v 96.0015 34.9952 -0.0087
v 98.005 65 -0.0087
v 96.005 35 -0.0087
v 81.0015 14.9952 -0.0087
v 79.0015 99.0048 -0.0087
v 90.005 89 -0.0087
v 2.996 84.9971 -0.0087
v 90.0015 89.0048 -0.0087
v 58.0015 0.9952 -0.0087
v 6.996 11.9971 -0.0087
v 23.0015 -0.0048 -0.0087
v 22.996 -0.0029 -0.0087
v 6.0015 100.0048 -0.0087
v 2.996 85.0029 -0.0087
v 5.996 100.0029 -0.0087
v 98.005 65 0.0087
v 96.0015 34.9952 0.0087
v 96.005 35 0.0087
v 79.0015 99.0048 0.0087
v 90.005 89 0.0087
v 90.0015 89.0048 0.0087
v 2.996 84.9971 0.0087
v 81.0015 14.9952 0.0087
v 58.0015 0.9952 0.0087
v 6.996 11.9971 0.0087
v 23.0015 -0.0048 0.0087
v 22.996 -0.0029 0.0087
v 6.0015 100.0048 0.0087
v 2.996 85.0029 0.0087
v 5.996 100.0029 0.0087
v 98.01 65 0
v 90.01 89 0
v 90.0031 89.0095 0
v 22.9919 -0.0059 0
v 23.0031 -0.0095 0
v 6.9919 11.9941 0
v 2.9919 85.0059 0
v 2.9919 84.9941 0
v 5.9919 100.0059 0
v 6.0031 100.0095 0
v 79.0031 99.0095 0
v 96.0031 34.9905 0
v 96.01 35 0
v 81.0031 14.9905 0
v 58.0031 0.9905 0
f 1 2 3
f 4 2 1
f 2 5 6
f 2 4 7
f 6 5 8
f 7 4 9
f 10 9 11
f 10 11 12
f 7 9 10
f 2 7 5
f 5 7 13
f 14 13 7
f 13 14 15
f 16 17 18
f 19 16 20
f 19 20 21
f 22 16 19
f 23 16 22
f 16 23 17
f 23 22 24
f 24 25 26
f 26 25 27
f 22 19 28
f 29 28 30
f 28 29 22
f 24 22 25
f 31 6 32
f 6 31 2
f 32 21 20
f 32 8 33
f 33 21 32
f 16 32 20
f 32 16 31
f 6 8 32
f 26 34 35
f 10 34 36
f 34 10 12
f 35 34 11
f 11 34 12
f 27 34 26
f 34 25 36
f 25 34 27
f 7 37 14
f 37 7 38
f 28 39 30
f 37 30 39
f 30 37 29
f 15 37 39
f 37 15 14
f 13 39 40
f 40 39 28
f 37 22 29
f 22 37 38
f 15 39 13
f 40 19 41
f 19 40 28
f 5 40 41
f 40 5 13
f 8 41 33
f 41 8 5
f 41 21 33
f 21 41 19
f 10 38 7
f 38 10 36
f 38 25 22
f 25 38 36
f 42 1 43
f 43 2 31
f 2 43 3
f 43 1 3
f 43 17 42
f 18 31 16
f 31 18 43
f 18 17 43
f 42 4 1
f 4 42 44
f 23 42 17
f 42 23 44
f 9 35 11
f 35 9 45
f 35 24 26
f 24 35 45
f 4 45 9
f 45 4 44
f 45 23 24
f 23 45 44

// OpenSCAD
color([0.9269770591996176,0.12480324665016229,0.8422397758241813]) hull(){
    translate([18,58]) sphere(0.01);
    translate([7,12]) sphere(0.01);
    translate([18,24]) sphere(0.01);
}
color([0.028249143050612435,0.8554899328562455,0.6212809598996976]) hull(){
    translate([90,89]) sphere(0.01);
    translate([93,72]) sphere(0.01);
    translate([98,65]) sphere(0.01);
}
color([0.6435486749275994,0.4857227915978113,0.2898251547629681]) hull(){
    translate([67,87]) sphere(0.01);
    translate([93,72]) sphere(0.01);
    translate([90,89]) sphere(0.01);
}
color([0.21709076393122206,0.4979948584580751,0.6176241526046676]) hull(){
    translate([93,72]) sphere(0.01);
    translate([67,87]) sphere(0.01);
    translate([63,74]) sphere(0.01);
}
color([0.4722249532281336,0.7228331534363125,0.6109414561657331]) hull(){
    translate([21,6]) sphere(0.01);
    translate([7,12]) sphere(0.01);
    translate([23,0]) sphere(0.01);
}
color([0.5330085163671737,0.6769359871291822,0.5973748769978083]) hull(){
    translate([7,12]) sphere(0.01);
    translate([21,6]) sphere(0.01);
    translate([18,24]) sphere(0.01);
}
color([0.14460255854654236,0.21273280877313017,0.8417179364881341]) hull(){
    translate([75,43]) sphere(0.01);
    translate([77,50]) sphere(0.01);
    translate([44,47]) sphere(0.01);
}
color([0.6300391880279899,0.5103677782275869,0.4479627161837708]) hull(){
    translate([10,94]) sphere(0.01);
    translate([6,100]) sphere(0.01);
    translate([3,85]) sphere(0.01);
}
color([0.2903518628620462,0.1744676713524972,0.5457372127765215]) hull(){
    translate([6,100]) sphere(0.01);
    translate([18,99]) sphere(0.01);
    translate([79,99]) sphere(0.01);
}
color([0.6340658375422632,0.7004271366493812,0.690956934786038]) hull(){
    translate([10,94]) sphere(0.01);
    translate([18,99]) sphere(0.01);
    translate([6,100]) sphere(0.01);
}
color([0.013948469234104865,0.8018456354370093,0.2607079205191076]) hull(){
    translate([39,98]) sphere(0.01);
    translate([31,91]) sphere(0.01);
    translate([37,88]) sphere(0.01);
}
color([0.01899716010339858,0.7507132946374245,0.44168653561511173]) hull(){
    translate([18,99]) sphere(0.01);
    translate([31,91]) sphere(0.01);
    translate([39,98]) sphere(0.01);
}
color([0.1668653701245908,0.45955837321901094,0.7876756969907556]) hull(){
    translate([31,91]) sphere(0.01);
    translate([18,99]) sphere(0.01);
    translate([22,90]) sphere(0.01);
}
color([0.09564527702692727,0.06733136152719421,0.7816649665975636]) hull(){
    translate([83,95]) sphere(0.01);
    translate([90,89]) sphere(0.01);
    translate([79,99]) sphere(0.01);
}
color([0.030385075649315252,0.33346286891595733,0.08647112242809318]) hull(){
    translate([83,95]) sphere(0.01);
    translate([67,87]) sphere(0.01);
    translate([90,89]) sphere(0.01);
}
color([0.8161439782233904,0.05657658467482607,0.8243668117903717]) hull(){
    translate([70,96]) sphere(0.01);
    translate([83,95]) sphere(0.01);
    translate([79,99]) sphere(0.01);
}
color([0.05808931884644186,0.6181904095369413,0.1426995958976538]) hull(){
    translate([83,95]) sphere(0.01);
    translate([70,96]) sphere(0.01);
    translate([67,87]) sphere(0.01);
}
color([0.3846464495954227,0.3794414211645075,0.7643773332264734]) hull(){
    translate([67,87]) sphere(0.01);
    translate([50,93]) sphere(0.01);
    translate([63,74]) sphere(0.01);
}
color([0.3116889002403487,0.7690158776827113,0.7674729074453902]) hull(){
    translate([24,21]) sphere(0.01);
    translate([26,22]) sphere(0.01);
    translate([18,24]) sphere(0.01);
}
color([0.3394448706328078,0.45855440081433096,0.0007502935671159783]) hull(){
    translate([21,6]) sphere(0.01);
    translate([24,21]) sphere(0.01);
    translate([18,24]) sphere(0.01);
}
color([0.8084995756647368,0.0331322283588068,0.9954935019736515]) hull(){
    translate([80,52]) sphere(0.01);
    translate([93,72]) sphere(0.01);
    translate([63,74]) sphere(0.01);
}
color([0.32750610520168044,0.511786711221762,0.09639677946248049]) hull(){
    translate([77,50]) sphere(0.01);
    translate([80,52]) sphere(0.01);
    translate([63,74]) sphere(0.01);
}
color([0.46647601470953737,0.043404226035316795,0.8089506697449751]) hull(){
    translate([7,12]) sphere(0.01);
    translate([6,77]) sphere(0.01);
    translate([3,85]) sphere(0.01);
}
color([0.9065579579370614,0.48874197586323487,0.4689182776921319]) hull(){
    translate([18,58]) sphere(0.01);
    translate([6,77]) sphere(0.01);
    translate([7,12]) sphere(0.01);
}
color([0.9999833648369341,0.42392948264922625,0.11056216143511133]) hull(){
    translate([7,86]) sphere(0.01);
    translate([10,94]) sphere(0.01);
    translate([3,85]) sphere(0.01);
}
color([0.5007484231317689,0.23725843071495933,0.7435751616565288]) hull(){
    translate([16,79]) sphere(0.01);
    translate([6,77]) sphere(0.01);
    translate([18,58]) sphere(0.01);
}
color([0.030326511183225713,0.9534383365251057,0.44454391677925087]) hull(){
    translate([16,79]) sphere(0.01);
    translate([39,67]) sphere(0.01);
    translate([20,83]) sphere(0.01);
}
color([0.4017260225039573,0.6984802625757133,0.14751428227125585]) hull(){
    translate([39,67]) sphere(0.01);
    translate([46,61]) sphere(0.01);
    translate([43,69]) sphere(0.01);
}
color([0.592053202978914,0.7602792343344718,0.23214841748979886]) hull(){
    translate([18,99]) sphere(0.01);
    translate([15,91]) sphere(0.01);
    translate([22,90]) sphere(0.01);
}
color([0.2215781656479593,0.24536616409996503,0.7021925659500807]) hull(){
    translate([15,91]) sphere(0.01);
    translate([18,99]) sphere(0.01);
    translate([10,94]) sphere(0.01);
}
color([0.5457605096294114,0.54011508338913,0.5459453680001618]) hull(){
    translate([15,91]) sphere(0.01);
    translate([20,83]) sphere(0.01);
    translate([22,90]) sphere(0.01);
}
color([0.21439919344985514,0.4167057873106884,0.6193494045718565]) hull(){
    translate([7,86]) sphere(0.01);
    translate([15,91]) sphere(0.01);
    translate([10,94]) sphere(0.01);
}
color([0.45760594266221877,0.8933837090972113,0.8109172526149769]) hull(){
    translate([15,91]) sphere(0.01);
    translate([16,79]) sphere(0.01);
    translate([20,83]) sphere(0.01);
}
color([0.14833972802097417,0.6068004170768148,0.5080529466064481]) hull(){
    translate([16,79]) sphere(0.01);
    translate([15,91]) sphere(0.01);
    translate([7,86]) sphere(0.01);
}
color([0.9906187087676633,0.11352393843166497,0.6883720652754897]) hull(){
    translate([31,91]) sphere(0.01);
    translate([30,90]) sphere(0.01);
    translate([37,88]) sphere(0.01);
}
color([0.5952346609945763,0.6540807806784664,0.3474259839548979]) hull(){
    translate([20,83]) sphere(0.01);
    translate([30,90]) sphere(0.01);
    translate([22,90]) sphere(0.01);
}
color([0.9928586924360654,0.247192741454632,0.70975753974483]) hull(){
    translate([30,90]) sphere(0.01);
    translate([31,91]) sphere(0.01);
    translate([22,90]) sphere(0.01);
}
color([0.13794757021236903,0.4611444179186315,0.04899626755467579]) hull(){
    translate([51,97]) sphere(0.01);
    translate([39,98]) sphere(0.01);
    translate([37,88]) sphere(0.01);
}
color([0.1977229983916683,0.036370797334404625,0.13840798504488894]) hull(){
    translate([70,96]) sphere(0.01);
    translate([64,91]) sphere(0.01);
    translate([67,87]) sphere(0.01);
}
color([0.695134065044521,0.2654011745990712,0.4635417367699751]) hull(){
    translate([64,91]) sphere(0.01);
    translate([50,93]) sphere(0.01);
    translate([67,87]) sphere(0.01);
}
color([0.14067843926211876,0.3233092624720053,0.6766209265725885]) hull(){
    translate([38,83]) sphere(0.01);
    translate([39,67]) sphere(0.01);
    translate([43,69]) sphere(0.01);
}
color([0.5598941248919586,0.2674263193966361,0.7715367321750608]) hull(){
    translate([38,83]) sphere(0.01);
    translate([51,97]) sphere(0.01);
    translate([37,88]) sphere(0.01);
}
color([0.7775867750177572,0.3358457771023752,0.7984986383285079]) hull(){
    translate([51,97]) sphere(0.01);
    translate([38,83]) sphere(0.01);
    translate([50,93]) sphere(0.01);
}
color([0.3608344962449672,0.130636609727118,0.1470050456404287]) hull(){
    translate([39,67]) sphere(0.01);
    translate([38,83]) sphere(0.01);
    translate([20,83]) sphere(0.01);
}
color([0.5817121628313788,0.46286602772829477,0.8824527290015699]) hull(){
    translate([30,90]) sphere(0.01);
    translate([38,83]) sphere(0.01);
    translate([37,88]) sphere(0.01);
}
color([0.1201105517589024,0.1938197880719691,0.4695931850983104]) hull(){
    translate([38,83]) sphere(0.01);
    translate([30,90]) sphere(0.01);
    translate([20,83]) sphere(0.01);
}
color([0.14078313852784263,0.6451769219884874,0.9811903017448982]) hull(){
    translate([45,42]) sphere(0.01);
    translate([42,29]) sphere(0.01);
    translate([55,32]) sphere(0.01);
}
color([0.8740229692652243,0.6541461711493592,0.21289315855754942]) hull(){
    translate([45,42]) sphere(0.01);
    translate([58,33]) sphere(0.01);
    translate([44,47]) sphere(0.01);
}
color([0.9328418457966335,0.42345059226773774,0.5012376899041451]) hull(){
    translate([58,33]) sphere(0.01);
    translate([45,42]) sphere(0.01);
    translate([55,32]) sphere(0.01);
}
color([0.5811541702347708,0.2791891573101454,0.2092311813057095]) hull(){
    translate([32,18]) sphere(0.01);
    translate([42,29]) sphere(0.01);
    translate([26,22]) sphere(0.01);
}
color([0.9628933046967749,0.6198760626942967,0.5999578261672418]) hull(){
    translate([32,18]) sphere(0.01);
    translate([21,6]) sphere(0.01);
    translate([23,0]) sphere(0.01);
}
color([0.23874719597172656,0.5159213977515871,0.8042715508319355]) hull(){
    translate([24,21]) sphere(0.01);
    translate([32,18]) sphere(0.01);
    translate([26,22]) sphere(0.01);
}
color([0.6755197251802578,0.41487488756696345,0.5733633065217538]) hull(){
    translate([32,18]) sphere(0.01);
    translate([24,21]) sphere(0.01);
    translate([21,6]) sphere(0.01);
}
color([0.8352652083788017,0.4789645616530247,0.8888242662849705]) hull(){
    translate([93,72]) sphere(0.01);
    translate([91,55]) sphere(0.01);
    translate([98,65]) sphere(0.01);
}
color([0.7977003312522131,0.4430245559395397,0.5757872208285841]) hull(){
    translate([80,52]) sphere(0.01);
    translate([91,55]) sphere(0.01);
    translate([93,72]) sphere(0.01);
}
color([0.18894415855786206,0.8084526775944827,0.5240727557148024]) hull(){
    translate([91,55]) sphere(0.01);
    translate([96,35]) sphere(0.01);
    translate([98,65]) sphere(0.01);
}
color([0.33009817895383553,0.6358447971330878,0.274476683198677]) hull(){
    translate([6,77]) sphere(0.01);
    translate([6,84]) sphere(0.01);
    translate([3,85]) sphere(0.01);
}
color([0.7036882936284021,0.9548751840233447,0.5755708060880032]) hull(){
    translate([6,84]) sphere(0.01);
    translate([7,86]) sphere(0.01);
    translate([3,85]) sphere(0.01);
}
color([0.41204698353559877,0.5796286851254486,0.28286322414623355]) hull(){
    translate([16,79]) sphere(0.01);
    translate([6,84]) sphere(0.01);
    translate([6,77]) sphere(0.01);
}
color([0.83488960487533,0.7968053445508819,0.9111606805714901]) hull(){
    translate([6,84]) sphere(0.01);
    translate([16,79]) sphere(0.01);
    translate([7,86]) sphere(0.01);
}
color([0.24277728252059738,0.2698201644401115,0.25372921938475945]) hull(){
    translate([30,57]) sphere(0.01);
    translate([16,79]) sphere(0.01);
    translate([18,58]) sphere(0.01);
}
color([0.3248429479181304,0.33731838939050207,0.46012102584031667]) hull(){
    translate([30,57]) sphere(0.01);
    translate([39,67]) sphere(0.01);
    translate([16,79]) sphere(0.01);
}
color([0.4972140619467261,0.4460540182101679,0.582257111213957]) hull(){
    translate([58,98]) sphere(0.01);
    translate([51,97]) sphere(0.01);
    translate([50,93]) sphere(0.01);
}
color([0.38189019333285656,0.9329183366158048,0.74346568951076]) hull(){
    translate([58,98]) sphere(0.01);
    translate([64,91]) sphere(0.01);
    translate([70,96]) sphere(0.01);
}
color([0.10367473231816282,0.6513301228797536,0.21210212161149367]) hull(){
    translate([64,91]) sphere(0.01);
    translate([58,98]) sphere(0.01);
    translate([50,93]) sphere(0.01);
}
color([0.4071949612628585,0.6715659813617996,0.17871221391606673]) hull(){
    translate([58,98]) sphere(0.01);
    translate([70,96]) sphere(0.01);
    translate([79,99]) sphere(0.01);
}
color([0.17752412341011714,0.6556599876579107,0.7040052939421468]) hull(){
    translate([51,97]) sphere(0.01);
    translate([58,98]) sphere(0.01);
    translate([39,98]) sphere(0.01);
}
color([0.9236087761692187,0.21340315940002685,0.5989435772305987]) hull(){
    translate([50,93]) sphere(0.01);
    translate([59,71]) sphere(0.01);
    translate([63,74]) sphere(0.01);
}
color([0.8450733127471588,0.6003349610680997,0.5954496070156984]) hull(){
    translate([38,83]) sphere(0.01);
    translate([59,71]) sphere(0.01);
    translate([50,93]) sphere(0.01);
}
color([0.920709623693076,0.4233833186292486,0.4754938941291812]) hull(){
    translate([59,71]) sphere(0.01);
    translate([38,83]) sphere(0.01);
    translate([43,69]) sphere(0.01);
}
color([0.872421437716006,0.9767589381362137,0.9086126193256788]) hull(){
    translate([46,61]) sphere(0.01);
    translate([59,71]) sphere(0.01);
    translate([43,69]) sphere(0.01);
}
color([0.7884233486788577,0.8262914624918754,0.6636415038118221]) hull(){
    translate([59,71]) sphere(0.01);
    translate([77,50]) sphere(0.01);
    translate([63,74]) sphere(0.01);
}
color([0.36270118963089737,0.5138414630226216,0.14357255994509865]) hull(){
    translate([59,71]) sphere(0.01);
    translate([46,61]) sphere(0.01);
    translate([77,50]) sphere(0.01);
}
color([0.466624584989368,0.29734697142143796,0.9844700368526675]) hull(){
    translate([76,28]) sphere(0.01);
    translate([74,41]) sphere(0.01);
    translate([58,33]) sphere(0.01);
}
color([0.6752891164641136,0.29017518075598103,0.4342964607752302]) hull(){
    translate([74,41]) sphere(0.01);
    translate([75,43]) sphere(0.01);
    translate([44,47]) sphere(0.01);
}
color([0.773003957160343,0.565247166210502,0.9239404304157245]) hull(){
    translate([58,33]) sphere(0.01);
    translate([74,41]) sphere(0.01);
    translate([44,47]) sphere(0.01);
}
color([0.16032310979410902,0.8355206000915061,0.5688487402091276]) hull(){
    translate([72,20]) sphere(0.01);
    translate([76,28]) sphere(0.01);
    translate([58,33]) sphere(0.01);
}
color([0.20030491603062106,0.9799112189115262,0.7788088383598656]) hull(){
    translate([72,20]) sphere(0.01);
    translate([68,15]) sphere(0.01);
    translate([81,15]) sphere(0.01);
}
color([0.3331229107175697,0.956723341350572,0.8892995412421422]) hull(){
    translate([32,18]) sphere(0.01);
    translate([64,14]) sphere(0.01);
    translate([42,29]) sphere(0.01);
}
color([0.9938355783742772,0.5564778243748569,0.9329279768345969]) hull(){
    translate([42,29]) sphere(0.01);
    translate([64,14]) sphere(0.01);
    translate([55,32]) sphere(0.01);
}
color([0.35340897744289224,0.12062022214202717,0.7238287945893779]) hull(){
    translate([64,14]) sphere(0.01);
    translate([58,33]) sphere(0.01);
    translate([55,32]) sphere(0.01);
}
color([0.8432397019629626,0.2883830928152321,0.23139986036280558]) hull(){
    translate([64,14]) sphere(0.01);
    translate([72,20]) sphere(0.01);
    translate([58,33]) sphere(0.01);
}
color([0.0180364627349191,0.35314011923198985,0.9589424474672257]) hull(){
    translate([72,20]) sphere(0.01);
    translate([64,14]) sphere(0.01);
    translate([68,15]) sphere(0.01);
}
color([0.2619290021782883,0.20369548429490625,0.5420815487250377]) hull(){
    translate([91,55]) sphere(0.01);
    translate([81,49]) sphere(0.01);
    translate([96,35]) sphere(0.01);
}
color([0.9221305525684157,0.837748898711002,0.8622867035840079]) hull(){
    translate([81,49]) sphere(0.01);
    translate([91,55]) sphere(0.01);
    translate([80,52]) sphere(0.01);
}
color([0.727429224436118,0.821332708873966,0.2567577523046298]) hull(){
    translate([96,35]) sphere(0.01);
    translate([81,49]) sphere(0.01);
    translate([75,43]) sphere(0.01);
}
color([0.1353372895865157,0.7613019869252476,0.15437996216449157]) hull(){
    translate([81,49]) sphere(0.01);
    translate([77,50]) sphere(0.01);
    translate([75,43]) sphere(0.01);
}
color([0.5724302025923821,0.22728732004270547,0.8377719495956792]) hull(){
    translate([81,49]) sphere(0.01);
    translate([80,52]) sphere(0.01);
    translate([77,50]) sphere(0.01);
}
color([0.3661955888727618,0.7135191579002272,0.515047468161266]) hull(){
    translate([35,48]) sphere(0.01);
    translate([45,42]) sphere(0.01);
    translate([44,47]) sphere(0.01);
}
color([0.13764795316468892,0.40448573996937276,0.8917260836787828]) hull(){
    translate([42,29]) sphere(0.01);
    translate([35,48]) sphere(0.01);
    translate([26,22]) sphere(0.01);
}
color([0.7643233656004556,0.5236824296690593,0.15029798138806982]) hull(){
    translate([45,42]) sphere(0.01);
    translate([35,48]) sphere(0.01);
    translate([42,29]) sphere(0.01);
}
color([0.9580407420374472,0.6000911555631969,0.025324835711835636]) hull(){
    translate([39,67]) sphere(0.01);
    translate([44,55]) sphere(0.01);
    translate([46,61]) sphere(0.01);
}
color([0.8628581448400192,0.48332959823715915,0.760144685355809]) hull(){
    translate([30,57]) sphere(0.01);
    translate([44,55]) sphere(0.01);
    translate([39,67]) sphere(0.01);
}
color([0.17349489212301172,0.7172022627612936,0.8738126079333703]) hull(){
    translate([35,48]) sphere(0.01);
    translate([44,55]) sphere(0.01);
    translate([30,57]) sphere(0.01);
}
color([0.7407081150283871,0.1750257628023656,0.7717601752613227]) hull(){
    translate([44,55]) sphere(0.01);
    translate([35,48]) sphere(0.01);
    translate([44,47]) sphere(0.01);
}
color([0.17462951192396858,0.1365817917740666,0.790898096633715]) hull(){
    translate([77,50]) sphere(0.01);
    translate([44,55]) sphere(0.01);
    translate([44,47]) sphere(0.01);
}
color([0.05068813004758421,0.2747417086491215,0.9775332998919624]) hull(){
    translate([46,61]) sphere(0.01);
    translate([44,55]) sphere(0.01);
    translate([77,50]) sphere(0.01);
}
color([0.3741990821064618,0.5760507248775137,0.9764706525564496]) hull(){
    translate([96,35]) sphere(0.01);
    translate([82,26]) sphere(0.01);
    translate([81,15]) sphere(0.01);
}
color([0.6412339051880062,0.9116486495874845,0.653753263894704]) hull(){
    translate([82,26]) sphere(0.01);
    translate([96,35]) sphere(0.01);
    translate([75,43]) sphere(0.01);
}
color([0.7391387592304974,0.7973855488942889,0.8338139774032114]) hull(){
    translate([74,41]) sphere(0.01);
    translate([82,26]) sphere(0.01);
    translate([75,43]) sphere(0.01);
}
color([0.5893068505654989,0.9387852932083598,0.6768105799142914]) hull(){
    translate([58,1]) sphere(0.01);
    translate([32,18]) sphere(0.01);
    translate([23,0]) sphere(0.01);
}
color([0.26314077483765086,0.6459233453457565,0.8790980253849315]) hull(){
    translate([58,1]) sphere(0.01);
    translate([64,14]) sphere(0.01);
    translate([32,18]) sphere(0.01);
}
color([0.15362837418895858,0.31061588741770185,0.8944360920803668]) hull(){
    translate([68,15]) sphere(0.01);
    translate([58,1]) sphere(0.01);
    translate([81,15]) sphere(0.01);
}
color([0.2723573567519545,0.029723278769515638,0.14137415559711708]) hull(){
    translate([64,14]) sphere(0.01);
    translate([58,1]) sphere(0.01);
    translate([68,15]) sphere(0.01);
}
color([0.24588268133825053,0.688989335517289,0.012833732972479917]) hull(){
    translate([26,51]) sphere(0.01);
    translate([30,57]) sphere(0.01);
    translate([18,58]) sphere(0.01);
}
color([0.4317421186444177,0.09476467904542085,0.2539030370426648]) hull(){
    translate([26,51]) sphere(0.01);
    translate([35,48]) sphere(0.01);
    translate([30,57]) sphere(0.01);
}
color([0.4433940275438375,0.6374619106411259,0.7629796076056016]) hull(){
    translate([26,51]) sphere(0.01);
    translate([18,58]) sphere(0.01);
    translate([18,24]) sphere(0.01);
}
color([0.33974962563874156,0.40746011996126574,0.8304662499681598]) hull(){
    translate([26,22]) sphere(0.01);
    translate([26,51]) sphere(0.01);
    translate([18,24]) sphere(0.01);
}
color([0.03737370743548629,0.7771030741686201,0.7450583503430228]) hull(){
    translate([35,48]) sphere(0.01);
    translate([26,51]) sphere(0.01);
    translate([26,22]) sphere(0.01);
}
color([0.7664898273962963,0.9635930682622835,0.37370940745190284]) hull(){
    translate([79,27]) sphere(0.01);
    translate([74,41]) sphere(0.01);
    translate([76,28]) sphere(0.01);
}
color([0.5269890278256799,0.7391003970289415,0.05440955639390033]) hull(){
    translate([79,27]) sphere(0.01);
    translate([82,26]) sphere(0.01);
    translate([74,41]) sphere(0.01);
}
color([0.16266859334294614,0.5860851836586503,0.6198514899274227]) hull(){
    translate([72,20]) sphere(0.01);
    translate([79,27]) sphere(0.01);
    translate([76,28]) sphere(0.01);
}
color([0.617768007375954,0.696939114622172,0.24987298892689824]) hull(){
    translate([79,27]) sphere(0.01);
    translate([72,20]) sphere(0.01);
    translate([81,15]) sphere(0.01);
}
color([0.10727882524928667,0.2542017095222042,0.647326061070541]) hull(){
    translate([82,26]) sphere(0.01);
    translate([79,27]) sphere(0.01);
    translate([81,15]) sphere(0.01);
}
color([0.6145129037504997,0.7319188036610002,0.2916410122362264]) hull(){
    translate([58,98]) sphere(0.01);
    translate([18,99]) sphere(0.01);
    translate([39,98]) sphere(0.01);
}
color([0.46410792523938205,0.009432899408237327,0.2601511175245954]) hull(){
    translate([18,99]) sphere(0.01);
    translate([58,98]) sphere(0.01);
    translate([79,99]) sphere(0.01);
}
